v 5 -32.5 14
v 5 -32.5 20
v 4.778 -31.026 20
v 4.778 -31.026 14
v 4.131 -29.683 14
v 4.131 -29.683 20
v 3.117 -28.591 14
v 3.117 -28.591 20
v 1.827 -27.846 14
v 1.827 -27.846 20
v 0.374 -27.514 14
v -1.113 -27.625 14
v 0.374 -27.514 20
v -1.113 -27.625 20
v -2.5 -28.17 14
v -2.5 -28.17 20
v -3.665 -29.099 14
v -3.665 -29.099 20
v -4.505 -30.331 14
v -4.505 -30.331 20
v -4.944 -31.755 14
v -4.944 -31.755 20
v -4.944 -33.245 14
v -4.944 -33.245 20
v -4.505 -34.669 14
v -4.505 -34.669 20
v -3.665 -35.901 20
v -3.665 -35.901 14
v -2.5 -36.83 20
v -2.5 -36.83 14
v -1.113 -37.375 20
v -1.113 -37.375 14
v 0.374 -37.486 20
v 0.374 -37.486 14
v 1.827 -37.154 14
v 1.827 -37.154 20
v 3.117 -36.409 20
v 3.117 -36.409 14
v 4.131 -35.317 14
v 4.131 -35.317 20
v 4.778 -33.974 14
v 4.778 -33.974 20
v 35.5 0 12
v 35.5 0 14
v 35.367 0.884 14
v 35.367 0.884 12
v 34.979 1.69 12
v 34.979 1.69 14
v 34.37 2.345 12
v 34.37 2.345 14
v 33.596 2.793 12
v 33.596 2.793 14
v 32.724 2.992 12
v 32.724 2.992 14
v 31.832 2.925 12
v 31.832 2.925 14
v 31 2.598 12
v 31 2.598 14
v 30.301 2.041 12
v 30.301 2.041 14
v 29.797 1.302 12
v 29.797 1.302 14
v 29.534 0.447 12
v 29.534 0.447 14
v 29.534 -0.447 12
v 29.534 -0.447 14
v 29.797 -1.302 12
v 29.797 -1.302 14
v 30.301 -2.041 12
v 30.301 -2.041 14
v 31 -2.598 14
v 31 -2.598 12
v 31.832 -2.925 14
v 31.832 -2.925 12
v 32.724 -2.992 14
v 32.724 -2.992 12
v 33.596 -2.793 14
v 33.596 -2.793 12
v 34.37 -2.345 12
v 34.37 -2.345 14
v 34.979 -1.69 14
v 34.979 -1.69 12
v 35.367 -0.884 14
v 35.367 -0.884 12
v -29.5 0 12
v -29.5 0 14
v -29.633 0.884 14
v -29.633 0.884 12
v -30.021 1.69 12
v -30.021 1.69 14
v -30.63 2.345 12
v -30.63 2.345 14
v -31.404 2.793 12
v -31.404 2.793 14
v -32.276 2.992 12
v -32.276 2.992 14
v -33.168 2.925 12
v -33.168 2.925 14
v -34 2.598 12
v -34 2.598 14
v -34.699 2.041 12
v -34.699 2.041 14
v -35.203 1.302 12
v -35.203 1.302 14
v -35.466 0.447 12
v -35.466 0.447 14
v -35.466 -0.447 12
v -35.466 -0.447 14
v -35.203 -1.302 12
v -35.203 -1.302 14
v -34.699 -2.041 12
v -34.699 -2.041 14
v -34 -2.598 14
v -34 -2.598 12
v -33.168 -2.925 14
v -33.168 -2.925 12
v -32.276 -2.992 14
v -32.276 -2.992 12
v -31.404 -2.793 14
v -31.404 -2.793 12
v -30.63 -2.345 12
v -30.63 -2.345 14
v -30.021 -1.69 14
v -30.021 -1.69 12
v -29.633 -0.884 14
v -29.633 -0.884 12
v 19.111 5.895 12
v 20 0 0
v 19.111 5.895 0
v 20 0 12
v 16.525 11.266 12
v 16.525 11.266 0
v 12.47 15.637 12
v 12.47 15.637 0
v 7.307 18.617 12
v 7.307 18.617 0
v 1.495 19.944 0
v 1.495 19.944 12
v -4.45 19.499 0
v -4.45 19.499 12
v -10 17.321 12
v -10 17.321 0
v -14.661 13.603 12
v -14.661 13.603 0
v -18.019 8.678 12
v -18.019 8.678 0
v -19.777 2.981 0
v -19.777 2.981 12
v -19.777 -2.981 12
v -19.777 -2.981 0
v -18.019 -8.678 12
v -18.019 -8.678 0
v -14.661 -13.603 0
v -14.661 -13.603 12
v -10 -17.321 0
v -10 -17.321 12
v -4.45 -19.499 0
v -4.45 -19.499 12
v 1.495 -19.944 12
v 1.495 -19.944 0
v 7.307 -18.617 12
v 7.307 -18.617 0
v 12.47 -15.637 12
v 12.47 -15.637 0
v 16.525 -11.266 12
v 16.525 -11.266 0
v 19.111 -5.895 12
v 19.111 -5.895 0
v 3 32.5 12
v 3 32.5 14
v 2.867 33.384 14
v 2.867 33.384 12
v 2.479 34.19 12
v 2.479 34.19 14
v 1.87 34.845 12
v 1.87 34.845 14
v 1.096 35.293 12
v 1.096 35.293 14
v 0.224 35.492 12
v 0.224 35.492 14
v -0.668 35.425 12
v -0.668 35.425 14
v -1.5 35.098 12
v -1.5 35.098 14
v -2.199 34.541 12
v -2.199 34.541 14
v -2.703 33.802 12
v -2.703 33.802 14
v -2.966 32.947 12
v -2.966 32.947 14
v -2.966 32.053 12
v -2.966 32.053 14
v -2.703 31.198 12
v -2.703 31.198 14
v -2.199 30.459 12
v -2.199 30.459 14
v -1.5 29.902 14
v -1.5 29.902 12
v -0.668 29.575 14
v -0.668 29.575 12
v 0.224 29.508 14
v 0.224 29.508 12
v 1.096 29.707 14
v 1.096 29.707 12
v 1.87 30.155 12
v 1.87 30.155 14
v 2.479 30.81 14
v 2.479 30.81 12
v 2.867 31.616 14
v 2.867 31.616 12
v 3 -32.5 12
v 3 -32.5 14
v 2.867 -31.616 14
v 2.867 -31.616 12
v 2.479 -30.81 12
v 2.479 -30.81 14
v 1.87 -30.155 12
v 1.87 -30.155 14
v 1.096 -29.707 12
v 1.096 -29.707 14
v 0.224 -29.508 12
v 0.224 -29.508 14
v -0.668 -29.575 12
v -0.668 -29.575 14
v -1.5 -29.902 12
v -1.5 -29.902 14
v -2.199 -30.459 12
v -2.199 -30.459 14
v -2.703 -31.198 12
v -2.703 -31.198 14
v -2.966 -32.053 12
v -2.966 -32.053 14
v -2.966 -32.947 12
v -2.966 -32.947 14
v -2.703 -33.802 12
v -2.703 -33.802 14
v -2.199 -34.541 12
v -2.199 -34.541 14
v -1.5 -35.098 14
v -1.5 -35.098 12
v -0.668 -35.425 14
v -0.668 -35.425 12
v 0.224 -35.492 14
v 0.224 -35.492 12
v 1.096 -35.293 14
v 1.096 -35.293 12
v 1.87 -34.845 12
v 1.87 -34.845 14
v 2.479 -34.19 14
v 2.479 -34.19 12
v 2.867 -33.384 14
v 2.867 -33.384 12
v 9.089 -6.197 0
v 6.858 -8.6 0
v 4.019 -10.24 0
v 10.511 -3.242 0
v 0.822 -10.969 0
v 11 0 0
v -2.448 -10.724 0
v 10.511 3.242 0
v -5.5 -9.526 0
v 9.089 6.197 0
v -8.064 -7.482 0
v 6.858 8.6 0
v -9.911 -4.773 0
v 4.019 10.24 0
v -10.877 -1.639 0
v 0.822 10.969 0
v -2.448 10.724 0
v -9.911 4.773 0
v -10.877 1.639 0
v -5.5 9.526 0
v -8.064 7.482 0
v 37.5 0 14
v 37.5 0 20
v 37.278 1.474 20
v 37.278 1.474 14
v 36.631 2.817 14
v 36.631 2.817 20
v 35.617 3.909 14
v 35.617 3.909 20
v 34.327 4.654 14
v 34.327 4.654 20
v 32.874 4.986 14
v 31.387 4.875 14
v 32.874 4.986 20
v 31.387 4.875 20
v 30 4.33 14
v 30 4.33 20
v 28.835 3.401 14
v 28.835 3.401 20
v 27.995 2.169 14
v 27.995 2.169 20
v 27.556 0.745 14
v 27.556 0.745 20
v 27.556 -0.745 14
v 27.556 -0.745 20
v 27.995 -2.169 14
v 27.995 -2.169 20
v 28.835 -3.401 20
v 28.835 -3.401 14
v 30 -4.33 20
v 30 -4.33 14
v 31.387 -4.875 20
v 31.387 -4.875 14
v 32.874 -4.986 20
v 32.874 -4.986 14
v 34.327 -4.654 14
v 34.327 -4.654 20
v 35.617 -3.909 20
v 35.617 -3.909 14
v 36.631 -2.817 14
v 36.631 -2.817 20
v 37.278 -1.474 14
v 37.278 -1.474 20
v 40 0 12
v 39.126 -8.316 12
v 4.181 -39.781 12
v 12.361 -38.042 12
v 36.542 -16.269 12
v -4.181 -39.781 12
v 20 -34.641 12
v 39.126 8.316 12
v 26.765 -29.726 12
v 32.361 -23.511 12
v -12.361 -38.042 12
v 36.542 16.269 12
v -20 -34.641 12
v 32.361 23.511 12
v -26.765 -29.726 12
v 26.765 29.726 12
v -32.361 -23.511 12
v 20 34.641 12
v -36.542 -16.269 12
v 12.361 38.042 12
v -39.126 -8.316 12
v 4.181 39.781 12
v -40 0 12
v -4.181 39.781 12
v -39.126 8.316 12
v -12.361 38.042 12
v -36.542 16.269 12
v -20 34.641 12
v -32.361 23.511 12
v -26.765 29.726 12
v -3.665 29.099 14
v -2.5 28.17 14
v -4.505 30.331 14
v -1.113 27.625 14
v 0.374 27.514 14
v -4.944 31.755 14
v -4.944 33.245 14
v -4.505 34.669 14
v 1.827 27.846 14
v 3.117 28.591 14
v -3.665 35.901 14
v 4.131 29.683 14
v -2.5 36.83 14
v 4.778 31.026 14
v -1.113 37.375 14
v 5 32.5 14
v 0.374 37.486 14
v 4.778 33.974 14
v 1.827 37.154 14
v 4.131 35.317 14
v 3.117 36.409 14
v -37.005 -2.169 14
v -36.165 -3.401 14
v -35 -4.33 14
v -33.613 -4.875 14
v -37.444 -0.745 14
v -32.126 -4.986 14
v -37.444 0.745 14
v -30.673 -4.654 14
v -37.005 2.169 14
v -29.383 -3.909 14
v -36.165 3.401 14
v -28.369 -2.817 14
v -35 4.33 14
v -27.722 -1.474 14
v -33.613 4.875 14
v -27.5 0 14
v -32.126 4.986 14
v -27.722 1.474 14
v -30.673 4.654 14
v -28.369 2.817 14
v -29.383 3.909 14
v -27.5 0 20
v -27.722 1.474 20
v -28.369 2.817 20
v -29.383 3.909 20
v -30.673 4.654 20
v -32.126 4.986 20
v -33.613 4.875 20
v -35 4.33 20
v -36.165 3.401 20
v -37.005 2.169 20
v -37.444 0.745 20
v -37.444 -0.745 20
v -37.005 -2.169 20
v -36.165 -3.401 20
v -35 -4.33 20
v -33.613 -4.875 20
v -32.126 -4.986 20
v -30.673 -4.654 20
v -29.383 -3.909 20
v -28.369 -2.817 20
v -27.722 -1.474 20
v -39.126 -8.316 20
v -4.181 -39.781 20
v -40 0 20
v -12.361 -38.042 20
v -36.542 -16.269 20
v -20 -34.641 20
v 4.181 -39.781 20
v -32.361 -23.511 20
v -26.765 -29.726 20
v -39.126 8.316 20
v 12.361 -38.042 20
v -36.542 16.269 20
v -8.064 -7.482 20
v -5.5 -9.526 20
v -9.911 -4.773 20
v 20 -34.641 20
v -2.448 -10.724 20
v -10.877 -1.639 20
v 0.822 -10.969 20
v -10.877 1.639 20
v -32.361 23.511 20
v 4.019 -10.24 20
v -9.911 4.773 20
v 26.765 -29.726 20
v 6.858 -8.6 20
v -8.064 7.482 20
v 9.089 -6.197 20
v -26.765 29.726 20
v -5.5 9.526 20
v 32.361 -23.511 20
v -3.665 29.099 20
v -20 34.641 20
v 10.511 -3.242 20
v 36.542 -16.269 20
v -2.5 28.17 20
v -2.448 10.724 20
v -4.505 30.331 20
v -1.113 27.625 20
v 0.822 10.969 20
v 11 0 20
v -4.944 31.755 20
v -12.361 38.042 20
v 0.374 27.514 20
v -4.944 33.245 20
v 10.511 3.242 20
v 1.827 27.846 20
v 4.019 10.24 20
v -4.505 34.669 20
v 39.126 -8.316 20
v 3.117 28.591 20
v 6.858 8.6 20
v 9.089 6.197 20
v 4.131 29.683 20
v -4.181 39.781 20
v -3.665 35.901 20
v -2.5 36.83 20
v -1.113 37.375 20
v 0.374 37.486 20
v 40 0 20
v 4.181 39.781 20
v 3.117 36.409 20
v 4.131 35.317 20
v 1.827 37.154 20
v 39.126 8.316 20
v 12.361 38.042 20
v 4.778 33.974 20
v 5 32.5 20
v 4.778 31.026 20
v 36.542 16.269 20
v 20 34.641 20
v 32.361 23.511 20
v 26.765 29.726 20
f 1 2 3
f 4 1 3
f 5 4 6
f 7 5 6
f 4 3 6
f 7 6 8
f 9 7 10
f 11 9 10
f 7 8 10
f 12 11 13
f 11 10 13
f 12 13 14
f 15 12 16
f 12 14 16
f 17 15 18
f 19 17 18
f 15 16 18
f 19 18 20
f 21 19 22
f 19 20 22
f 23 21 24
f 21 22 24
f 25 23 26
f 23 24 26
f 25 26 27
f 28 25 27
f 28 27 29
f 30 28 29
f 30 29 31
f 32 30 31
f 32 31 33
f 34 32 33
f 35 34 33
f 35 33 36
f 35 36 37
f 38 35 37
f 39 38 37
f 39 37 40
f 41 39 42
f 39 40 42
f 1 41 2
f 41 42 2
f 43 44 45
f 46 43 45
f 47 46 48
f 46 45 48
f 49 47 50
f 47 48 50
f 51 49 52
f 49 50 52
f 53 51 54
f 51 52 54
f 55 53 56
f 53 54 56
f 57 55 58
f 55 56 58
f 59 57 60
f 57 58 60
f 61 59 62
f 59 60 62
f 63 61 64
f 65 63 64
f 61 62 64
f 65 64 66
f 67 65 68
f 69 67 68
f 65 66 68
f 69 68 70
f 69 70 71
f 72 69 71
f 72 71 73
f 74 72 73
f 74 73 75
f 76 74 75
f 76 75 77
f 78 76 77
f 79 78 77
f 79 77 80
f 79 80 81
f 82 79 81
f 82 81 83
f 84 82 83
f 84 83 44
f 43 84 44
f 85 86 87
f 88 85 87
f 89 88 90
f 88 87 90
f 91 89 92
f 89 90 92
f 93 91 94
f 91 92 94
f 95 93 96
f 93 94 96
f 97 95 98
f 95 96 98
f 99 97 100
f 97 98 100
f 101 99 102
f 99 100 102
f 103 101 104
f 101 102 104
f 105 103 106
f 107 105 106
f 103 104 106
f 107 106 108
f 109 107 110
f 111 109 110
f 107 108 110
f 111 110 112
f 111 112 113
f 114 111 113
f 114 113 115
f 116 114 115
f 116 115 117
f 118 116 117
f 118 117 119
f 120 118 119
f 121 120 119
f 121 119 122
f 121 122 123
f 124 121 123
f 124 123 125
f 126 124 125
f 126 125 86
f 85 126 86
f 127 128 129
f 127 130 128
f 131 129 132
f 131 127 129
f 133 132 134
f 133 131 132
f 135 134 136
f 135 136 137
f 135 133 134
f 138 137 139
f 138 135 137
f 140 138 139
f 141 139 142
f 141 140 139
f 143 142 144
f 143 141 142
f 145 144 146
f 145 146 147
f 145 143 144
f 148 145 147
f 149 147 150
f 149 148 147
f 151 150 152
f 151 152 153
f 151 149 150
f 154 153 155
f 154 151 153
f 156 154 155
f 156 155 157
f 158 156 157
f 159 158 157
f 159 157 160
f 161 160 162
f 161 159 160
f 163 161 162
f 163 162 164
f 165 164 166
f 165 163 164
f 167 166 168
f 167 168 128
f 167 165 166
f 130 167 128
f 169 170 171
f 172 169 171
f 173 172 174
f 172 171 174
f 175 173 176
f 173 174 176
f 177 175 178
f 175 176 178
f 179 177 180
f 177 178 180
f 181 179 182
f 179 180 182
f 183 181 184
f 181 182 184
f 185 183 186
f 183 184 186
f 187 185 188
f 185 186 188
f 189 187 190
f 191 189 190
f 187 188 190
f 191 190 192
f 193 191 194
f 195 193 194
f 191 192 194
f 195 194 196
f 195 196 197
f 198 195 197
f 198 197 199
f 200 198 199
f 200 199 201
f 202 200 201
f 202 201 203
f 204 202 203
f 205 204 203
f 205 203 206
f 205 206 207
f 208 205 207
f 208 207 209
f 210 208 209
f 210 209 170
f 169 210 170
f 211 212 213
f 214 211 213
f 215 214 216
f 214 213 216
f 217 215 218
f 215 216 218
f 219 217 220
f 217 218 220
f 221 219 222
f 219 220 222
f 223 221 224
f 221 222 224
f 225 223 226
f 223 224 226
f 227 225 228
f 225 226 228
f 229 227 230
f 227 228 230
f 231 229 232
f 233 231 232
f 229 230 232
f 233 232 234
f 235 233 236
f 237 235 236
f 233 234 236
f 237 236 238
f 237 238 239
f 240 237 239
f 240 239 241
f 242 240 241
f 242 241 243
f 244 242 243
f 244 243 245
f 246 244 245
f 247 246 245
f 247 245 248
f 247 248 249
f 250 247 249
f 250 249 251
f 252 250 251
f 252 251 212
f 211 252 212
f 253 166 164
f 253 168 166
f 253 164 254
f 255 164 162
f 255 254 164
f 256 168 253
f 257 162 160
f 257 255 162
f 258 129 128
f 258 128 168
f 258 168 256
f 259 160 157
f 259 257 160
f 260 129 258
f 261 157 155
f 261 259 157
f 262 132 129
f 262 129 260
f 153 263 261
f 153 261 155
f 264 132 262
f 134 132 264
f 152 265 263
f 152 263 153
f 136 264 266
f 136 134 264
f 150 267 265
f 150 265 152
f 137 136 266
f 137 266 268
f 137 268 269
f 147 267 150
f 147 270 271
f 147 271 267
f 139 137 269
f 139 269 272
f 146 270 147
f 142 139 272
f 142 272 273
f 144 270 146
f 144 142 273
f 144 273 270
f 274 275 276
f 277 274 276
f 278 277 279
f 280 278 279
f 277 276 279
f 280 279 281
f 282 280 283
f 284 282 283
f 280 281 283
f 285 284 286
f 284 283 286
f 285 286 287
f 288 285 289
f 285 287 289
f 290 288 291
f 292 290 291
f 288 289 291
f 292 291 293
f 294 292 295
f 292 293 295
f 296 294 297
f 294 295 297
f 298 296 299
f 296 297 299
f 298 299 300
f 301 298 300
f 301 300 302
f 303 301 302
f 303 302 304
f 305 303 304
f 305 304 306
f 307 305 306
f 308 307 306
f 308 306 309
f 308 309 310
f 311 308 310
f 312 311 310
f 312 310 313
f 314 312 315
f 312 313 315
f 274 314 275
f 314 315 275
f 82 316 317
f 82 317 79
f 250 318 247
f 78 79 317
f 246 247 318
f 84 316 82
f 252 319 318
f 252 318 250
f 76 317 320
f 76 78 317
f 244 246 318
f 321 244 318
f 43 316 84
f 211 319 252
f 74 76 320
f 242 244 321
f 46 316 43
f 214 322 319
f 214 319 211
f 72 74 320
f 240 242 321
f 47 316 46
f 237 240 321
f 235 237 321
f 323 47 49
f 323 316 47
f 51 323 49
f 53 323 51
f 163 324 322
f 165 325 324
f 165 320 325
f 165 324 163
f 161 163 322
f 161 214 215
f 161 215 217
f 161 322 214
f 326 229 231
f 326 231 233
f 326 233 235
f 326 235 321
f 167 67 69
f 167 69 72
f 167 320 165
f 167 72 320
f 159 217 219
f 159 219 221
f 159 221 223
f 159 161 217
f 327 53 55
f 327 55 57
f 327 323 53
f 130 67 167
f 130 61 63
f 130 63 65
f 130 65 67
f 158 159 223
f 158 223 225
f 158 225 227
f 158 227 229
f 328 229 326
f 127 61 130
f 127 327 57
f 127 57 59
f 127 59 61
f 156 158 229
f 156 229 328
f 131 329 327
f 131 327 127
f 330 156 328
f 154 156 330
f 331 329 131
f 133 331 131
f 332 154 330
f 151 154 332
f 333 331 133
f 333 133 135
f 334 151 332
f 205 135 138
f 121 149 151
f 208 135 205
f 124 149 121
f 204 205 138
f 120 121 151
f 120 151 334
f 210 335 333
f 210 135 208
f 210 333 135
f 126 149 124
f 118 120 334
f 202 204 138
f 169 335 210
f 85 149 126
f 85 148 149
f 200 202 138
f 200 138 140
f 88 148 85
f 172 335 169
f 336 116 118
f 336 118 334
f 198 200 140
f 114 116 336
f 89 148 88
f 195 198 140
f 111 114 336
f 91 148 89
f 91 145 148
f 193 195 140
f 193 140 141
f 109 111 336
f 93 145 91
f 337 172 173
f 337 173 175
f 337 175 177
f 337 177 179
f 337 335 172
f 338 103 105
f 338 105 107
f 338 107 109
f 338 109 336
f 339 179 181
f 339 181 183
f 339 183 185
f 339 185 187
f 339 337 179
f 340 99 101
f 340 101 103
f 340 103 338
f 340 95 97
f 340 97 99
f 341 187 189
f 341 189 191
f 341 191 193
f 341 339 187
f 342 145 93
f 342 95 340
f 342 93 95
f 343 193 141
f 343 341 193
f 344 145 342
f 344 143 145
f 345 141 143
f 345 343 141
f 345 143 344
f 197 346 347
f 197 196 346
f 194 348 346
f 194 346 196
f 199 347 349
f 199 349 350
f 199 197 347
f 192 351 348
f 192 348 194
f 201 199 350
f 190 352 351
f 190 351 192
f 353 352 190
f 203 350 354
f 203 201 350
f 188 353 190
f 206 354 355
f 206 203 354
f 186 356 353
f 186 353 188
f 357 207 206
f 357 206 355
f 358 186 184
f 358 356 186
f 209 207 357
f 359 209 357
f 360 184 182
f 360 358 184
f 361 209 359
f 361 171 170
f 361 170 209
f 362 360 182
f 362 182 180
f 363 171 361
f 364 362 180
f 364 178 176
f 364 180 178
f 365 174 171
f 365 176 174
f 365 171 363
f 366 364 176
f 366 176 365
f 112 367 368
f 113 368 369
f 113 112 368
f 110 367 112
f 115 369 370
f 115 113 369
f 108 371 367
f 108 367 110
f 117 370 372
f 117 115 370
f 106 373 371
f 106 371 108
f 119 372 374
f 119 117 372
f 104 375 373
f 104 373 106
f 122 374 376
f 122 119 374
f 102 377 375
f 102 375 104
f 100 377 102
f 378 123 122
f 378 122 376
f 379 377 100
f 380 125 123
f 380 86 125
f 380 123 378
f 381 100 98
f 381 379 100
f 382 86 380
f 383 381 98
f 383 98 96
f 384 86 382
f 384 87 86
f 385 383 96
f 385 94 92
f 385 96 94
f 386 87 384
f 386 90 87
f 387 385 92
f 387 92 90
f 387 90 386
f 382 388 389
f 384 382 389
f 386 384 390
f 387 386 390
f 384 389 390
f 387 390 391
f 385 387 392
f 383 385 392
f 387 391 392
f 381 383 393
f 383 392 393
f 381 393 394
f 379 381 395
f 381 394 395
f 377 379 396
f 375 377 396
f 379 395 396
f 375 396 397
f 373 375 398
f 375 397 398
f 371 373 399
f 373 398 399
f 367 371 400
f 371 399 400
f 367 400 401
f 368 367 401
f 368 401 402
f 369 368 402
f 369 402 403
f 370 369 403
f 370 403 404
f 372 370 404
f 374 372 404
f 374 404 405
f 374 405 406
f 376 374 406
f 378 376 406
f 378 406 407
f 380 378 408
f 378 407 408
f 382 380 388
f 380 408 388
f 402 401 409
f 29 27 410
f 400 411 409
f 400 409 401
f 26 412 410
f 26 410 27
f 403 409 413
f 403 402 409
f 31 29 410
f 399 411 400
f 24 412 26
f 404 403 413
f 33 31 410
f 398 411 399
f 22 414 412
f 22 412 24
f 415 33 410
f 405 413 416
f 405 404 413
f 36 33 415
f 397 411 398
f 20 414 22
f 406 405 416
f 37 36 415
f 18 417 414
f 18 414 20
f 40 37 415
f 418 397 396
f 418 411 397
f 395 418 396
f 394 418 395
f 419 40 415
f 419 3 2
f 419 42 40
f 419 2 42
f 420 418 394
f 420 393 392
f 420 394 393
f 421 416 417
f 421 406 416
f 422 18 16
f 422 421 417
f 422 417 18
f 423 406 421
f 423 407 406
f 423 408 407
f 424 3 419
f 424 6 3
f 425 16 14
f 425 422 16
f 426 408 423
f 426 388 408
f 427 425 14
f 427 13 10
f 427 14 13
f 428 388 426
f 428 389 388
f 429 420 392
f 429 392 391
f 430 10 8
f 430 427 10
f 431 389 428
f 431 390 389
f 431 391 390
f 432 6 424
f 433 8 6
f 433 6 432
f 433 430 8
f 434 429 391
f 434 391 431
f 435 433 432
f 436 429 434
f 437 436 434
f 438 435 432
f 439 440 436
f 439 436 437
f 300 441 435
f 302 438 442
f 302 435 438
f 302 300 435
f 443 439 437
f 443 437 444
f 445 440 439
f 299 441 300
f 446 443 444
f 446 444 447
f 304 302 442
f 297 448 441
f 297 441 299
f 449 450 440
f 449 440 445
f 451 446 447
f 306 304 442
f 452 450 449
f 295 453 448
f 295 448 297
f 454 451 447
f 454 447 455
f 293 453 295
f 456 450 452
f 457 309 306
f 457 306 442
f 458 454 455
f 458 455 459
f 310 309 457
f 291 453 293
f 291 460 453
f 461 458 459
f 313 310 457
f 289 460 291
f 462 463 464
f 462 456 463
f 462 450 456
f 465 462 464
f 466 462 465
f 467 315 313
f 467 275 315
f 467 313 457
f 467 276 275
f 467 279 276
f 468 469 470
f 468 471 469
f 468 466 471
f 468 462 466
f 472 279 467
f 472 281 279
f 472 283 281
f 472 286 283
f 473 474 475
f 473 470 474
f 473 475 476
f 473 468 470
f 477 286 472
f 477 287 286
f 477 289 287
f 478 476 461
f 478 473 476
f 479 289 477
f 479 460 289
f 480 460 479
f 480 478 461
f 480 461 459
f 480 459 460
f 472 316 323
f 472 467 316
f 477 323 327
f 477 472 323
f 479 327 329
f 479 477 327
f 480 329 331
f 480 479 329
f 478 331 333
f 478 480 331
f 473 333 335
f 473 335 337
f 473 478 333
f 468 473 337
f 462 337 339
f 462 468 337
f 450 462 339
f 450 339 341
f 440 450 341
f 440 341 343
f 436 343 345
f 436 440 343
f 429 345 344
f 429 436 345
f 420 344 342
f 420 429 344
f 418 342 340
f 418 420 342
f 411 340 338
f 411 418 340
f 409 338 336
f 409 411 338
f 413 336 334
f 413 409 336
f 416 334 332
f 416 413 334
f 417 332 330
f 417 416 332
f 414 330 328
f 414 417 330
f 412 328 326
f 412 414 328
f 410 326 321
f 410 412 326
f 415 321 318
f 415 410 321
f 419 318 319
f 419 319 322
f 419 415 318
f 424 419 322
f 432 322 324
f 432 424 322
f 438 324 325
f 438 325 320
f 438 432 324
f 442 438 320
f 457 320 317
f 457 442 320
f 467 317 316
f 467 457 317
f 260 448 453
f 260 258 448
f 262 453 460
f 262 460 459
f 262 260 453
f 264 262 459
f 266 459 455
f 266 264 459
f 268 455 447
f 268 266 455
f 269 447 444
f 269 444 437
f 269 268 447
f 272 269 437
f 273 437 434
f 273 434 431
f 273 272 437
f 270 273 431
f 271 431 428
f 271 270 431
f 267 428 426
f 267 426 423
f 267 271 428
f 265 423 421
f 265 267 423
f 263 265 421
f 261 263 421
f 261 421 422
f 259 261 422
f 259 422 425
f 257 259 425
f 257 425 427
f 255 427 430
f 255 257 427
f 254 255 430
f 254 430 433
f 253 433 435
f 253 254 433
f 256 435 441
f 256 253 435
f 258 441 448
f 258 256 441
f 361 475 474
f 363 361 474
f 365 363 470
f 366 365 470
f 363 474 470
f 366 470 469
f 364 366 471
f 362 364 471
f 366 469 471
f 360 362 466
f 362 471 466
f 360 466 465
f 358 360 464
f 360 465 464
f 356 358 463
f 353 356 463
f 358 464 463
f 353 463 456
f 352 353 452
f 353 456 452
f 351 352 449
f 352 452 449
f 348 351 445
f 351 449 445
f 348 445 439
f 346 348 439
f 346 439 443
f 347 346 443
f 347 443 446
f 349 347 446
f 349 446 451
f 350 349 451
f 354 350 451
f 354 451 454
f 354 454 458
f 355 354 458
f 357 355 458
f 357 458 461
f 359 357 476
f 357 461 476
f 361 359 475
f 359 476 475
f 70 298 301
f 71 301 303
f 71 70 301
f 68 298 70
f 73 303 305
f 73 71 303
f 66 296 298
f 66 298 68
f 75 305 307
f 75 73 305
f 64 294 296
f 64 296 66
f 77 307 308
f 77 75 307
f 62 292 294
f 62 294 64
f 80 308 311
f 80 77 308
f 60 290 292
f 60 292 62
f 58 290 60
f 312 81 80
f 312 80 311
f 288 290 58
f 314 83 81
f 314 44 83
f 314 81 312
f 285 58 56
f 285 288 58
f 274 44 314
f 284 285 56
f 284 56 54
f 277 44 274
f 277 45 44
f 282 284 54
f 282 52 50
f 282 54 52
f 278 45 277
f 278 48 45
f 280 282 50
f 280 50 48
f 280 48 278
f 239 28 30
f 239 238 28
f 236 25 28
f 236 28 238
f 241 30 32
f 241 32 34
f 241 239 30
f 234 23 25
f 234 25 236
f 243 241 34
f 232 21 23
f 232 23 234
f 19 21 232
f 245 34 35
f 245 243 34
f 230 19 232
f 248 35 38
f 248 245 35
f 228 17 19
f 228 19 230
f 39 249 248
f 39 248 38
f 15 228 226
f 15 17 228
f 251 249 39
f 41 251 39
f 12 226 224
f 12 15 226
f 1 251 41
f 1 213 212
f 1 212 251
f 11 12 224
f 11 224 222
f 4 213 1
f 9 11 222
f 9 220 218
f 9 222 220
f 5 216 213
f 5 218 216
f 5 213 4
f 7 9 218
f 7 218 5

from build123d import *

# Parameters (mm, degrees)
F2_R     = 3
F3_DEPTH = 20.001
F4_R     = 5
F5_DEPTH = 6


with BuildPart() as f1:
    # F0 (on Front) → F1 (revolve)
    with BuildSketch(Plane.XZ):
        Polygon((11, 20), (11, 0), (20, 0), (20, 12), (40, 12), (40, 20), align=None)
    revolve(axis=Axis((0, 0, 10), (0, 0, 1)))

    # F2 (on face) → F3 (cut, through all)
    with BuildSketch(Plane.XY.offset(20)):
        with Locations((0, 32.5)):
            Circle(F2_R)
        with Locations((-32.5, 0)):
            Circle(F2_R)
        with Locations((0, -32.5)):
            Circle(F2_R)
        with Locations((32.5, 0)):
            Circle(F2_R)
    extrude(amount=-F3_DEPTH, mode=Mode.SUBTRACT)

    # F4 (on face) → F5 (cut)
    with BuildSketch(Plane.XY.offset(20)):
        with Locations((0, 32.5)):
            Circle(F4_R)
        with Locations((-32.5, 0)):
            Circle(F4_R)
        with Locations((0, -32.5)):
            Circle(F4_R)
        with Locations((32.5, 0)):
            Circle(F4_R)
    extrude(amount=-F5_DEPTH, mode=Mode.SUBTRACT)


solid = f1.part
